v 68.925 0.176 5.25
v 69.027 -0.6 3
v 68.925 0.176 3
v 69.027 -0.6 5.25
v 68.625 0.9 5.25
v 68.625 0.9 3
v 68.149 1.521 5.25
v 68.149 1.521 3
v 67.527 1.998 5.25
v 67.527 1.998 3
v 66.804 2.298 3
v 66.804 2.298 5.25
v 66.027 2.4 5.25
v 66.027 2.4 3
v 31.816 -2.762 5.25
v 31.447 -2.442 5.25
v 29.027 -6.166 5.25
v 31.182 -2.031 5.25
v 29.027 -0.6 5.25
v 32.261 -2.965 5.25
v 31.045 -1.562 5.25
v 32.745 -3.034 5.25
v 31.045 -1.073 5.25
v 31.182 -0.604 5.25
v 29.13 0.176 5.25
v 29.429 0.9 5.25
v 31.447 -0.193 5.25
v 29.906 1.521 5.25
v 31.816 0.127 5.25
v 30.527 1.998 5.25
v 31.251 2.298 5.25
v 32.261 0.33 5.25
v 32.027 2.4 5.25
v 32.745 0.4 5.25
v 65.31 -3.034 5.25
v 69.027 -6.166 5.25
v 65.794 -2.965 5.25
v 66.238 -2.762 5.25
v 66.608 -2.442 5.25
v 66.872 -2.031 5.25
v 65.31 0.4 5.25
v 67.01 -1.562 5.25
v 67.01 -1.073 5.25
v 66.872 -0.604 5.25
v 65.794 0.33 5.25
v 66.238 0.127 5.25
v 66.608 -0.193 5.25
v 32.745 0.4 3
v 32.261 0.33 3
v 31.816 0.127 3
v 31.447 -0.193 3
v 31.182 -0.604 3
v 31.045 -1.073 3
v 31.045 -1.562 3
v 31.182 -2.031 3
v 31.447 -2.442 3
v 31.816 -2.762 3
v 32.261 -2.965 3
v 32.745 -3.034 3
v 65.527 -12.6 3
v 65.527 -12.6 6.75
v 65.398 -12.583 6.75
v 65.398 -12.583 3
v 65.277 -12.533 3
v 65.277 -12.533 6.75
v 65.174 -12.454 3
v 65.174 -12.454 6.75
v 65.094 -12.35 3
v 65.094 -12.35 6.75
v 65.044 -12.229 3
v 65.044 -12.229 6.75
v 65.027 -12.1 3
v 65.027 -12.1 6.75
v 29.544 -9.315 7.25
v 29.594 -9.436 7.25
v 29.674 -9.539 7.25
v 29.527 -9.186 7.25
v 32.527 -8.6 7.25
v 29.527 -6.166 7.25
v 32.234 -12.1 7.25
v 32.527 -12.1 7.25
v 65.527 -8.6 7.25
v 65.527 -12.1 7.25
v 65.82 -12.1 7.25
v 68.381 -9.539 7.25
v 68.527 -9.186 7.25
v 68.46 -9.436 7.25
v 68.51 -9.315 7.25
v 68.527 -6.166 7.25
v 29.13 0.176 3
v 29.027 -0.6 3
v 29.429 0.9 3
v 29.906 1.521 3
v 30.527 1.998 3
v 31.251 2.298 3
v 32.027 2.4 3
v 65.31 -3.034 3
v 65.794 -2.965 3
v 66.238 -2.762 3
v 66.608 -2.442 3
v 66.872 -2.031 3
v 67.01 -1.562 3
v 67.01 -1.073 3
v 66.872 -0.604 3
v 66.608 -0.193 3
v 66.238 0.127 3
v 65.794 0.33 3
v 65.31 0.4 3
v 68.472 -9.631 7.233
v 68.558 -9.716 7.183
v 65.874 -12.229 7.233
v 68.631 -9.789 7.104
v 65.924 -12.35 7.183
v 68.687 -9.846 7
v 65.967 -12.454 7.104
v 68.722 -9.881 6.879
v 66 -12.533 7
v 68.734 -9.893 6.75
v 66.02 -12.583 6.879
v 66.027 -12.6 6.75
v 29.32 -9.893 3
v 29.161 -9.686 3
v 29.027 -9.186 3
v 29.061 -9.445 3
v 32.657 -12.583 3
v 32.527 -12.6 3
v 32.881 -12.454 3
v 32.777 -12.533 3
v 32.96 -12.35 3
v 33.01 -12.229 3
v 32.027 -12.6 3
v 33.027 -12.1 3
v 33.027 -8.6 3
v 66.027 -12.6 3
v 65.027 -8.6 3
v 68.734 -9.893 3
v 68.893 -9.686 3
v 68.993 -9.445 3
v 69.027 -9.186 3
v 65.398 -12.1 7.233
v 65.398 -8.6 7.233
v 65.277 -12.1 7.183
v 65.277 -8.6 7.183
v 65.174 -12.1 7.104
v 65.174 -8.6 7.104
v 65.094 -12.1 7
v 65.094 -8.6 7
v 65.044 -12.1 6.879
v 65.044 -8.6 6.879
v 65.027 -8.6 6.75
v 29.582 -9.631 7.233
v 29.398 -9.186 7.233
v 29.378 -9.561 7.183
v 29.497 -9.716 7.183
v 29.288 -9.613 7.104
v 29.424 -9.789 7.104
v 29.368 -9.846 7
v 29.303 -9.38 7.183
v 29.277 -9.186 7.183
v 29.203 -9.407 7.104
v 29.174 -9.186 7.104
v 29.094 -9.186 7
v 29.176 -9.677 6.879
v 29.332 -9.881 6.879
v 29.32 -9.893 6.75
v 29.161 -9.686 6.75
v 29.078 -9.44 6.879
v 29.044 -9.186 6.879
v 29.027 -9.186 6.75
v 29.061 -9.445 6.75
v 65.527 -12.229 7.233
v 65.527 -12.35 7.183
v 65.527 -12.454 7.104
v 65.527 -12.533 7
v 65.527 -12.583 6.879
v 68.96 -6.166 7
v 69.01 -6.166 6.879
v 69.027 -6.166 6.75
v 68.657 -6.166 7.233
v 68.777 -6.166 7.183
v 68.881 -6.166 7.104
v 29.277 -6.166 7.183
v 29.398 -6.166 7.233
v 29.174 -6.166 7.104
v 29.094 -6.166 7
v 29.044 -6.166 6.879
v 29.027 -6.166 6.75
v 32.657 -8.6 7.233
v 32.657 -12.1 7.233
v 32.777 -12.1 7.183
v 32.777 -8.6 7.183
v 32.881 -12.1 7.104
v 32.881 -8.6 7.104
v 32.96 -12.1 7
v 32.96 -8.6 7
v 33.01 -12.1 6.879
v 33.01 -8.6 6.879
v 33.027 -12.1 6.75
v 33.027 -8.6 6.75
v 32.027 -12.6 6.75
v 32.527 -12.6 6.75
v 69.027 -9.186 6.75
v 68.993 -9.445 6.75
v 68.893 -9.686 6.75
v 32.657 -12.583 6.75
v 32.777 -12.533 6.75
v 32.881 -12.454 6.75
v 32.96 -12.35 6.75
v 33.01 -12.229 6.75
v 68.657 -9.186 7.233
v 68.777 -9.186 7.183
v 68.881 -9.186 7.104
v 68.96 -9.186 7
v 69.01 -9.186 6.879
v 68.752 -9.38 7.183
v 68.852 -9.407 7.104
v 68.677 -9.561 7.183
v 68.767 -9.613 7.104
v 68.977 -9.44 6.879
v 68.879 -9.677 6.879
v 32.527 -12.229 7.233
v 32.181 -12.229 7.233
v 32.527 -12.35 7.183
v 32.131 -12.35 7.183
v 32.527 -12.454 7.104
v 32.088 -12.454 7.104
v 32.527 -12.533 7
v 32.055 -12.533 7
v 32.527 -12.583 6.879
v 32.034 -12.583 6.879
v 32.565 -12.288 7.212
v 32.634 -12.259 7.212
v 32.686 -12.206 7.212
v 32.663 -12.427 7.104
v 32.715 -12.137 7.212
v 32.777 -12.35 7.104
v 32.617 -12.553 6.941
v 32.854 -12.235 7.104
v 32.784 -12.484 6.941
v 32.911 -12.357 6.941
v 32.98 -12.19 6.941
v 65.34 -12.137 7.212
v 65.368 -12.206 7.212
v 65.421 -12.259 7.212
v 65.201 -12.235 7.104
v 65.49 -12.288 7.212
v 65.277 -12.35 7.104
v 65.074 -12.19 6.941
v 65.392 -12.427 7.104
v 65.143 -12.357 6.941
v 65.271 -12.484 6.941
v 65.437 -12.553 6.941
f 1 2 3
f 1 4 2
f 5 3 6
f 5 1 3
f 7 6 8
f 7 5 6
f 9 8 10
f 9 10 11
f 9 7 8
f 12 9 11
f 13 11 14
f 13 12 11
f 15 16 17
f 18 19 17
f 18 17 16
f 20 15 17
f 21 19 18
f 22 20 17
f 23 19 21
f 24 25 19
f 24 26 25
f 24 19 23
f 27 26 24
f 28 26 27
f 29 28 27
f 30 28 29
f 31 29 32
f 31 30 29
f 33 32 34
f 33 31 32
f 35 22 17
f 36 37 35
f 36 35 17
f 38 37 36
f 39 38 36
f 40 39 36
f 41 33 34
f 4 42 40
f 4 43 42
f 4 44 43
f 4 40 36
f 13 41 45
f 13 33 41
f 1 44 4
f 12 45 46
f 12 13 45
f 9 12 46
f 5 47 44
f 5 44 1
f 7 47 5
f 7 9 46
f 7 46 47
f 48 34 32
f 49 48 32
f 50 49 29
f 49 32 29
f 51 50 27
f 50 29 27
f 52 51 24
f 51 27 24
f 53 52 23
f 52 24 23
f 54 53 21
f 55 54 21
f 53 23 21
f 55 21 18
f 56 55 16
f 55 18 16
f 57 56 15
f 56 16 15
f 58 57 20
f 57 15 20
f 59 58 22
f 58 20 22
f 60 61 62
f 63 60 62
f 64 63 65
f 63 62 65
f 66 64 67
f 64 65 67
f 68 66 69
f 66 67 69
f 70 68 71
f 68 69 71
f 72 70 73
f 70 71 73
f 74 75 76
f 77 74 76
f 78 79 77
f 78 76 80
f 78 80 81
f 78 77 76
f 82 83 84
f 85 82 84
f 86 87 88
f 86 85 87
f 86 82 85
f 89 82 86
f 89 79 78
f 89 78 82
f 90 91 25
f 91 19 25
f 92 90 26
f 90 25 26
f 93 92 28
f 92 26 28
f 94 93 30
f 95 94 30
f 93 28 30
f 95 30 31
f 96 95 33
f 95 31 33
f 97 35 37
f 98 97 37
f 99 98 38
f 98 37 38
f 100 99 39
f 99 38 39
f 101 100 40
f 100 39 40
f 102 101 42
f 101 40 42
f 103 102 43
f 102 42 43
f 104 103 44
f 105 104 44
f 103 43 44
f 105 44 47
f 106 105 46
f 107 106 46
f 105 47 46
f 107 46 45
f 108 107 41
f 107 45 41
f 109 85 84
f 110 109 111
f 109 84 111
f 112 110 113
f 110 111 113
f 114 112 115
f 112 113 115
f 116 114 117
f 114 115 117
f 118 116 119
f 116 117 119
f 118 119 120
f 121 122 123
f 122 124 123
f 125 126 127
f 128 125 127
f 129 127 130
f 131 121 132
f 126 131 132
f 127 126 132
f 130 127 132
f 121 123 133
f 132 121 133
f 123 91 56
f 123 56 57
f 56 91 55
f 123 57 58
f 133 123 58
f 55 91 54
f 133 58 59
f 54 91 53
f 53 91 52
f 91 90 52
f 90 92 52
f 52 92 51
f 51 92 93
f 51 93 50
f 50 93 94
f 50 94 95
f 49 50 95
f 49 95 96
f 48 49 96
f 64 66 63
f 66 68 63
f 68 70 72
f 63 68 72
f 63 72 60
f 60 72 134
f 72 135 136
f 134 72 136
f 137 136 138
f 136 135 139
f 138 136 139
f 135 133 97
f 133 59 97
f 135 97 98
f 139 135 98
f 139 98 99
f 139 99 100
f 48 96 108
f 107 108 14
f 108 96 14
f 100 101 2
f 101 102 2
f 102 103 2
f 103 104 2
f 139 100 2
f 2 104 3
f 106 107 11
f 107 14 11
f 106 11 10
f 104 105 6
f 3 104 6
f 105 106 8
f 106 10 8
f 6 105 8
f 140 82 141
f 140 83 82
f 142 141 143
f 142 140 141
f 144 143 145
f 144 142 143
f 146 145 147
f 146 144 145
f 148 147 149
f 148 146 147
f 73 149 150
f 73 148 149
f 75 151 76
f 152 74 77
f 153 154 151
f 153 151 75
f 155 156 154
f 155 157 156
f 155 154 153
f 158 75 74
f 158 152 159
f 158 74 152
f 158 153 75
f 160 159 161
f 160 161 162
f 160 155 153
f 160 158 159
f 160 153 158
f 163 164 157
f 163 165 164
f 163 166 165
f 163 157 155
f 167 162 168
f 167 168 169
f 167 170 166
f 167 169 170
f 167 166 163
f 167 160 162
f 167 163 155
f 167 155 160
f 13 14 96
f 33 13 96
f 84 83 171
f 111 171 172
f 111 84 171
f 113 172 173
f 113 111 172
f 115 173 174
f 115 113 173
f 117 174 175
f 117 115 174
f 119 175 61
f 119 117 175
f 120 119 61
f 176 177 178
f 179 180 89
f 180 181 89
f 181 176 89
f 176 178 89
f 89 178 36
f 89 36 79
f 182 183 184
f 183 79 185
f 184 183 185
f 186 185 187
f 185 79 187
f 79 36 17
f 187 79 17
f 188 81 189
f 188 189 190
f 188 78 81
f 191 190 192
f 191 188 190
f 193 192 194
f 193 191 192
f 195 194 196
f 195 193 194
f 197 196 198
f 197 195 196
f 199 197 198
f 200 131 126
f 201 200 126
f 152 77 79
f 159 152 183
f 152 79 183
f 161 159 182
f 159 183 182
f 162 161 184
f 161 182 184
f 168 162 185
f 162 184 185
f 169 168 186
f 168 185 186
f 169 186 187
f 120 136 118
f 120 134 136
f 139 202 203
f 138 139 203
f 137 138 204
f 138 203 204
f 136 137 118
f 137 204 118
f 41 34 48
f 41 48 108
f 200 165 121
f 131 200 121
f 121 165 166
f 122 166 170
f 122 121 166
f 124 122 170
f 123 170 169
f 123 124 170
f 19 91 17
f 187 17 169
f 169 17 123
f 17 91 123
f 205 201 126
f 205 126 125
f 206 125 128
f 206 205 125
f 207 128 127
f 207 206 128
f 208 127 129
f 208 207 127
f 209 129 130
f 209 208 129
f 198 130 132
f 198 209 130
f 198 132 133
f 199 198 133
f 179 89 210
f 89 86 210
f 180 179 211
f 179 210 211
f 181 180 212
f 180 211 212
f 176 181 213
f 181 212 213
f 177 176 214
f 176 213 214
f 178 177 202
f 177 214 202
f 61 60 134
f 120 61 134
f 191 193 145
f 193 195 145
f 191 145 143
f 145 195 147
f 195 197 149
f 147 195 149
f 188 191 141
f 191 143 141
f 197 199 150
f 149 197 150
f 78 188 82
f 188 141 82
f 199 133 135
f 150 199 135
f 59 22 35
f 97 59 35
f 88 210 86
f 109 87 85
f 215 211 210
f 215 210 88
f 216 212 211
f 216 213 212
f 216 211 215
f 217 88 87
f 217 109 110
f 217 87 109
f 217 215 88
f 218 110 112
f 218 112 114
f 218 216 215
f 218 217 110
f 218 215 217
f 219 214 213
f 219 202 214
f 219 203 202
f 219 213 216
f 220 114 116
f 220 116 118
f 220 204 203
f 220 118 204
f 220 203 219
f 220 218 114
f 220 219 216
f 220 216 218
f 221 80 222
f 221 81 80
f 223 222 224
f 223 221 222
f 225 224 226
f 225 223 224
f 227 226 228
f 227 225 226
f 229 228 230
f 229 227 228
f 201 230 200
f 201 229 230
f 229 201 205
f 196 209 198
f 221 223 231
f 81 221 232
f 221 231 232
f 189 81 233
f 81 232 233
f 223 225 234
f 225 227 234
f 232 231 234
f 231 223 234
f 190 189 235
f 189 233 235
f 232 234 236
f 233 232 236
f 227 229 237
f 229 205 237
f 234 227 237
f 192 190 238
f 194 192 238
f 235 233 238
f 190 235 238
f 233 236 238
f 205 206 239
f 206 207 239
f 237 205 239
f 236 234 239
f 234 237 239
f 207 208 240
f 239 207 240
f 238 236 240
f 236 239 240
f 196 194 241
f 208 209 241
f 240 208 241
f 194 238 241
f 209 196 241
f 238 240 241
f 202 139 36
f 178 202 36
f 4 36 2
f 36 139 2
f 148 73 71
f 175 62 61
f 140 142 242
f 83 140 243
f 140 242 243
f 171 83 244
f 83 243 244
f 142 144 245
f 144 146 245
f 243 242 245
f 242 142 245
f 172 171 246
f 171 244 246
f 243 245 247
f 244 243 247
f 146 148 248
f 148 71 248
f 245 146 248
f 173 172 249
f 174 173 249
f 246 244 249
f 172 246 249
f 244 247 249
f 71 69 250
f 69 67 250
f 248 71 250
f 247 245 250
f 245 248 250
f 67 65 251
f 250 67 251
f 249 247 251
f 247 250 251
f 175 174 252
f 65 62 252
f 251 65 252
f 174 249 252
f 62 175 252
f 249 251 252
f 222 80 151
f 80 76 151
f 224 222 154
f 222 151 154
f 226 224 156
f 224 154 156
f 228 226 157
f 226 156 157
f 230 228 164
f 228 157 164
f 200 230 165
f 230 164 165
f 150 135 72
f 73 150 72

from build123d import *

# Parameters (mm, degrees)
PAD_DEPTH       = 2.25
POCKET_DEPTH    = 5
PAD009_DEPTH    = 2
FILLET003_R     = 0.5
CHAMFER001_SIZE = 3
FILLET004_R     = 1
FILLET008_R     = 0.5
FILLET009_R     = 3


with BuildPart() as part:
    # Sketch → Pad (new body)
    with BuildSketch(Plane.XY):
        Polygon((-0.972695, 0), (3.027305, 0), (3.027305, 4), (35.027305, 4), (35.027305, 0), (39.027305, 0), (39.027305, 15), (-0.972695, 15), align=None)
    extrude(amount=PAD_DEPTH)

    # Sketch002 → Pocket (cut)
    with BuildSketch(Plane.XY.offset(2.25)):
        with BuildLine():
            ThreePointArc((2.744542, 13), (1.027305, 11.282763), (2.744542, 9.565525))
            Line((2.744542, 9.565525), (35.310067, 9.565525))
            ThreePointArc((35.310067, 9.565525), (37.027305, 11.282763), (35.310067, 13))
            Line((2.744542, 13), (35.310067, 13))
        make_face()
    extrude(amount=-POCKET_DEPTH, mode=Mode.SUBTRACT)

    # Sketch012 (on Face5 of Pocket) → Pad009 (join)
    with BuildSketch(Plane.XY.offset(2.25)):
        Polygon((-0.972695, 0), (3.027305, 0), (3.027305, 4), (35.027305, 4), (35.027305, 0), (39.027305, 0), (39.027305, 6.433802), (-0.972695, 6.433802), align=None)
    extrude(amount=PAD009_DEPTH)

    # Fillet003
    fillet003_edges = [part.edges().sort_by_distance(p)[0] for p in [
        (3.027305, 0, 1.125),
        (3.027305, 0, 3.25),
        (35.027305, 0, 1.125),
        (35.027305, 0, 3.25),
    ]]
    fillet(fillet003_edges, radius=FILLET003_R)

    # Chamfer001
    chamfer001_edges = [part.edges().sort_by_distance(p)[0] for p in [
        (-0.972695, 0, 1.125),
        (-0.972695, 0, 3.25),
        (39.027305, 0, 1.125),
        (39.027305, 0, 3.25),
    ]]
    chamfer(chamfer001_edges, length=CHAMFER001_SIZE)

    # Fillet004
    fillet004_edges = [part.edges().sort_by_distance(p)[0] for p in [
        (39.027305, 3, 3.25),
        (39.027305, 3, 1.125),
        (-0.972695, 3, 3.25),
        (-0.972695, 3, 1.125),
    ]]
    fillet(fillet004_edges, radius=FILLET004_R)

    # Fillet008
    fillet008_edges = [part.edges().sort_by_distance(p)[0] for p in [
        (0.673752, 1.353553, 4.25),
        (2.277305, 0, 4.25),
        (2.880858, 0.146447, 4.25),
        (3.027305, 2.25, 4.25),
        (-0.896575, 3.03153, 4.25),
        (-0.972695, 4.924008, 4.25),
        (35.027305, 2.25, 4.25),
        (35.173752, 0.146447, 4.25),
        (35.777305, 0, 4.25),
        (37.380858, 1.353553, 4.25),
        (38.951184, 3.03153, 4.25),
        (39.027305, 4.924008, 4.25),
    ]]
    fillet(fillet008_edges, radius=FILLET008_R)

    # Fillet009
    fillet009_edges = [part.edges().sort_by_distance(p)[0] for p in [
        (-0.972695, 15, 1.125),
        (39.027305, 15, 1.125),
    ]]
    fillet(fillet009_edges, radius=FILLET009_R)


with BuildPart() as part_1:
    # Body placement: moved
    add(part.part.moved(Location((30, -12.6, 3))))


solid = part_1.part
